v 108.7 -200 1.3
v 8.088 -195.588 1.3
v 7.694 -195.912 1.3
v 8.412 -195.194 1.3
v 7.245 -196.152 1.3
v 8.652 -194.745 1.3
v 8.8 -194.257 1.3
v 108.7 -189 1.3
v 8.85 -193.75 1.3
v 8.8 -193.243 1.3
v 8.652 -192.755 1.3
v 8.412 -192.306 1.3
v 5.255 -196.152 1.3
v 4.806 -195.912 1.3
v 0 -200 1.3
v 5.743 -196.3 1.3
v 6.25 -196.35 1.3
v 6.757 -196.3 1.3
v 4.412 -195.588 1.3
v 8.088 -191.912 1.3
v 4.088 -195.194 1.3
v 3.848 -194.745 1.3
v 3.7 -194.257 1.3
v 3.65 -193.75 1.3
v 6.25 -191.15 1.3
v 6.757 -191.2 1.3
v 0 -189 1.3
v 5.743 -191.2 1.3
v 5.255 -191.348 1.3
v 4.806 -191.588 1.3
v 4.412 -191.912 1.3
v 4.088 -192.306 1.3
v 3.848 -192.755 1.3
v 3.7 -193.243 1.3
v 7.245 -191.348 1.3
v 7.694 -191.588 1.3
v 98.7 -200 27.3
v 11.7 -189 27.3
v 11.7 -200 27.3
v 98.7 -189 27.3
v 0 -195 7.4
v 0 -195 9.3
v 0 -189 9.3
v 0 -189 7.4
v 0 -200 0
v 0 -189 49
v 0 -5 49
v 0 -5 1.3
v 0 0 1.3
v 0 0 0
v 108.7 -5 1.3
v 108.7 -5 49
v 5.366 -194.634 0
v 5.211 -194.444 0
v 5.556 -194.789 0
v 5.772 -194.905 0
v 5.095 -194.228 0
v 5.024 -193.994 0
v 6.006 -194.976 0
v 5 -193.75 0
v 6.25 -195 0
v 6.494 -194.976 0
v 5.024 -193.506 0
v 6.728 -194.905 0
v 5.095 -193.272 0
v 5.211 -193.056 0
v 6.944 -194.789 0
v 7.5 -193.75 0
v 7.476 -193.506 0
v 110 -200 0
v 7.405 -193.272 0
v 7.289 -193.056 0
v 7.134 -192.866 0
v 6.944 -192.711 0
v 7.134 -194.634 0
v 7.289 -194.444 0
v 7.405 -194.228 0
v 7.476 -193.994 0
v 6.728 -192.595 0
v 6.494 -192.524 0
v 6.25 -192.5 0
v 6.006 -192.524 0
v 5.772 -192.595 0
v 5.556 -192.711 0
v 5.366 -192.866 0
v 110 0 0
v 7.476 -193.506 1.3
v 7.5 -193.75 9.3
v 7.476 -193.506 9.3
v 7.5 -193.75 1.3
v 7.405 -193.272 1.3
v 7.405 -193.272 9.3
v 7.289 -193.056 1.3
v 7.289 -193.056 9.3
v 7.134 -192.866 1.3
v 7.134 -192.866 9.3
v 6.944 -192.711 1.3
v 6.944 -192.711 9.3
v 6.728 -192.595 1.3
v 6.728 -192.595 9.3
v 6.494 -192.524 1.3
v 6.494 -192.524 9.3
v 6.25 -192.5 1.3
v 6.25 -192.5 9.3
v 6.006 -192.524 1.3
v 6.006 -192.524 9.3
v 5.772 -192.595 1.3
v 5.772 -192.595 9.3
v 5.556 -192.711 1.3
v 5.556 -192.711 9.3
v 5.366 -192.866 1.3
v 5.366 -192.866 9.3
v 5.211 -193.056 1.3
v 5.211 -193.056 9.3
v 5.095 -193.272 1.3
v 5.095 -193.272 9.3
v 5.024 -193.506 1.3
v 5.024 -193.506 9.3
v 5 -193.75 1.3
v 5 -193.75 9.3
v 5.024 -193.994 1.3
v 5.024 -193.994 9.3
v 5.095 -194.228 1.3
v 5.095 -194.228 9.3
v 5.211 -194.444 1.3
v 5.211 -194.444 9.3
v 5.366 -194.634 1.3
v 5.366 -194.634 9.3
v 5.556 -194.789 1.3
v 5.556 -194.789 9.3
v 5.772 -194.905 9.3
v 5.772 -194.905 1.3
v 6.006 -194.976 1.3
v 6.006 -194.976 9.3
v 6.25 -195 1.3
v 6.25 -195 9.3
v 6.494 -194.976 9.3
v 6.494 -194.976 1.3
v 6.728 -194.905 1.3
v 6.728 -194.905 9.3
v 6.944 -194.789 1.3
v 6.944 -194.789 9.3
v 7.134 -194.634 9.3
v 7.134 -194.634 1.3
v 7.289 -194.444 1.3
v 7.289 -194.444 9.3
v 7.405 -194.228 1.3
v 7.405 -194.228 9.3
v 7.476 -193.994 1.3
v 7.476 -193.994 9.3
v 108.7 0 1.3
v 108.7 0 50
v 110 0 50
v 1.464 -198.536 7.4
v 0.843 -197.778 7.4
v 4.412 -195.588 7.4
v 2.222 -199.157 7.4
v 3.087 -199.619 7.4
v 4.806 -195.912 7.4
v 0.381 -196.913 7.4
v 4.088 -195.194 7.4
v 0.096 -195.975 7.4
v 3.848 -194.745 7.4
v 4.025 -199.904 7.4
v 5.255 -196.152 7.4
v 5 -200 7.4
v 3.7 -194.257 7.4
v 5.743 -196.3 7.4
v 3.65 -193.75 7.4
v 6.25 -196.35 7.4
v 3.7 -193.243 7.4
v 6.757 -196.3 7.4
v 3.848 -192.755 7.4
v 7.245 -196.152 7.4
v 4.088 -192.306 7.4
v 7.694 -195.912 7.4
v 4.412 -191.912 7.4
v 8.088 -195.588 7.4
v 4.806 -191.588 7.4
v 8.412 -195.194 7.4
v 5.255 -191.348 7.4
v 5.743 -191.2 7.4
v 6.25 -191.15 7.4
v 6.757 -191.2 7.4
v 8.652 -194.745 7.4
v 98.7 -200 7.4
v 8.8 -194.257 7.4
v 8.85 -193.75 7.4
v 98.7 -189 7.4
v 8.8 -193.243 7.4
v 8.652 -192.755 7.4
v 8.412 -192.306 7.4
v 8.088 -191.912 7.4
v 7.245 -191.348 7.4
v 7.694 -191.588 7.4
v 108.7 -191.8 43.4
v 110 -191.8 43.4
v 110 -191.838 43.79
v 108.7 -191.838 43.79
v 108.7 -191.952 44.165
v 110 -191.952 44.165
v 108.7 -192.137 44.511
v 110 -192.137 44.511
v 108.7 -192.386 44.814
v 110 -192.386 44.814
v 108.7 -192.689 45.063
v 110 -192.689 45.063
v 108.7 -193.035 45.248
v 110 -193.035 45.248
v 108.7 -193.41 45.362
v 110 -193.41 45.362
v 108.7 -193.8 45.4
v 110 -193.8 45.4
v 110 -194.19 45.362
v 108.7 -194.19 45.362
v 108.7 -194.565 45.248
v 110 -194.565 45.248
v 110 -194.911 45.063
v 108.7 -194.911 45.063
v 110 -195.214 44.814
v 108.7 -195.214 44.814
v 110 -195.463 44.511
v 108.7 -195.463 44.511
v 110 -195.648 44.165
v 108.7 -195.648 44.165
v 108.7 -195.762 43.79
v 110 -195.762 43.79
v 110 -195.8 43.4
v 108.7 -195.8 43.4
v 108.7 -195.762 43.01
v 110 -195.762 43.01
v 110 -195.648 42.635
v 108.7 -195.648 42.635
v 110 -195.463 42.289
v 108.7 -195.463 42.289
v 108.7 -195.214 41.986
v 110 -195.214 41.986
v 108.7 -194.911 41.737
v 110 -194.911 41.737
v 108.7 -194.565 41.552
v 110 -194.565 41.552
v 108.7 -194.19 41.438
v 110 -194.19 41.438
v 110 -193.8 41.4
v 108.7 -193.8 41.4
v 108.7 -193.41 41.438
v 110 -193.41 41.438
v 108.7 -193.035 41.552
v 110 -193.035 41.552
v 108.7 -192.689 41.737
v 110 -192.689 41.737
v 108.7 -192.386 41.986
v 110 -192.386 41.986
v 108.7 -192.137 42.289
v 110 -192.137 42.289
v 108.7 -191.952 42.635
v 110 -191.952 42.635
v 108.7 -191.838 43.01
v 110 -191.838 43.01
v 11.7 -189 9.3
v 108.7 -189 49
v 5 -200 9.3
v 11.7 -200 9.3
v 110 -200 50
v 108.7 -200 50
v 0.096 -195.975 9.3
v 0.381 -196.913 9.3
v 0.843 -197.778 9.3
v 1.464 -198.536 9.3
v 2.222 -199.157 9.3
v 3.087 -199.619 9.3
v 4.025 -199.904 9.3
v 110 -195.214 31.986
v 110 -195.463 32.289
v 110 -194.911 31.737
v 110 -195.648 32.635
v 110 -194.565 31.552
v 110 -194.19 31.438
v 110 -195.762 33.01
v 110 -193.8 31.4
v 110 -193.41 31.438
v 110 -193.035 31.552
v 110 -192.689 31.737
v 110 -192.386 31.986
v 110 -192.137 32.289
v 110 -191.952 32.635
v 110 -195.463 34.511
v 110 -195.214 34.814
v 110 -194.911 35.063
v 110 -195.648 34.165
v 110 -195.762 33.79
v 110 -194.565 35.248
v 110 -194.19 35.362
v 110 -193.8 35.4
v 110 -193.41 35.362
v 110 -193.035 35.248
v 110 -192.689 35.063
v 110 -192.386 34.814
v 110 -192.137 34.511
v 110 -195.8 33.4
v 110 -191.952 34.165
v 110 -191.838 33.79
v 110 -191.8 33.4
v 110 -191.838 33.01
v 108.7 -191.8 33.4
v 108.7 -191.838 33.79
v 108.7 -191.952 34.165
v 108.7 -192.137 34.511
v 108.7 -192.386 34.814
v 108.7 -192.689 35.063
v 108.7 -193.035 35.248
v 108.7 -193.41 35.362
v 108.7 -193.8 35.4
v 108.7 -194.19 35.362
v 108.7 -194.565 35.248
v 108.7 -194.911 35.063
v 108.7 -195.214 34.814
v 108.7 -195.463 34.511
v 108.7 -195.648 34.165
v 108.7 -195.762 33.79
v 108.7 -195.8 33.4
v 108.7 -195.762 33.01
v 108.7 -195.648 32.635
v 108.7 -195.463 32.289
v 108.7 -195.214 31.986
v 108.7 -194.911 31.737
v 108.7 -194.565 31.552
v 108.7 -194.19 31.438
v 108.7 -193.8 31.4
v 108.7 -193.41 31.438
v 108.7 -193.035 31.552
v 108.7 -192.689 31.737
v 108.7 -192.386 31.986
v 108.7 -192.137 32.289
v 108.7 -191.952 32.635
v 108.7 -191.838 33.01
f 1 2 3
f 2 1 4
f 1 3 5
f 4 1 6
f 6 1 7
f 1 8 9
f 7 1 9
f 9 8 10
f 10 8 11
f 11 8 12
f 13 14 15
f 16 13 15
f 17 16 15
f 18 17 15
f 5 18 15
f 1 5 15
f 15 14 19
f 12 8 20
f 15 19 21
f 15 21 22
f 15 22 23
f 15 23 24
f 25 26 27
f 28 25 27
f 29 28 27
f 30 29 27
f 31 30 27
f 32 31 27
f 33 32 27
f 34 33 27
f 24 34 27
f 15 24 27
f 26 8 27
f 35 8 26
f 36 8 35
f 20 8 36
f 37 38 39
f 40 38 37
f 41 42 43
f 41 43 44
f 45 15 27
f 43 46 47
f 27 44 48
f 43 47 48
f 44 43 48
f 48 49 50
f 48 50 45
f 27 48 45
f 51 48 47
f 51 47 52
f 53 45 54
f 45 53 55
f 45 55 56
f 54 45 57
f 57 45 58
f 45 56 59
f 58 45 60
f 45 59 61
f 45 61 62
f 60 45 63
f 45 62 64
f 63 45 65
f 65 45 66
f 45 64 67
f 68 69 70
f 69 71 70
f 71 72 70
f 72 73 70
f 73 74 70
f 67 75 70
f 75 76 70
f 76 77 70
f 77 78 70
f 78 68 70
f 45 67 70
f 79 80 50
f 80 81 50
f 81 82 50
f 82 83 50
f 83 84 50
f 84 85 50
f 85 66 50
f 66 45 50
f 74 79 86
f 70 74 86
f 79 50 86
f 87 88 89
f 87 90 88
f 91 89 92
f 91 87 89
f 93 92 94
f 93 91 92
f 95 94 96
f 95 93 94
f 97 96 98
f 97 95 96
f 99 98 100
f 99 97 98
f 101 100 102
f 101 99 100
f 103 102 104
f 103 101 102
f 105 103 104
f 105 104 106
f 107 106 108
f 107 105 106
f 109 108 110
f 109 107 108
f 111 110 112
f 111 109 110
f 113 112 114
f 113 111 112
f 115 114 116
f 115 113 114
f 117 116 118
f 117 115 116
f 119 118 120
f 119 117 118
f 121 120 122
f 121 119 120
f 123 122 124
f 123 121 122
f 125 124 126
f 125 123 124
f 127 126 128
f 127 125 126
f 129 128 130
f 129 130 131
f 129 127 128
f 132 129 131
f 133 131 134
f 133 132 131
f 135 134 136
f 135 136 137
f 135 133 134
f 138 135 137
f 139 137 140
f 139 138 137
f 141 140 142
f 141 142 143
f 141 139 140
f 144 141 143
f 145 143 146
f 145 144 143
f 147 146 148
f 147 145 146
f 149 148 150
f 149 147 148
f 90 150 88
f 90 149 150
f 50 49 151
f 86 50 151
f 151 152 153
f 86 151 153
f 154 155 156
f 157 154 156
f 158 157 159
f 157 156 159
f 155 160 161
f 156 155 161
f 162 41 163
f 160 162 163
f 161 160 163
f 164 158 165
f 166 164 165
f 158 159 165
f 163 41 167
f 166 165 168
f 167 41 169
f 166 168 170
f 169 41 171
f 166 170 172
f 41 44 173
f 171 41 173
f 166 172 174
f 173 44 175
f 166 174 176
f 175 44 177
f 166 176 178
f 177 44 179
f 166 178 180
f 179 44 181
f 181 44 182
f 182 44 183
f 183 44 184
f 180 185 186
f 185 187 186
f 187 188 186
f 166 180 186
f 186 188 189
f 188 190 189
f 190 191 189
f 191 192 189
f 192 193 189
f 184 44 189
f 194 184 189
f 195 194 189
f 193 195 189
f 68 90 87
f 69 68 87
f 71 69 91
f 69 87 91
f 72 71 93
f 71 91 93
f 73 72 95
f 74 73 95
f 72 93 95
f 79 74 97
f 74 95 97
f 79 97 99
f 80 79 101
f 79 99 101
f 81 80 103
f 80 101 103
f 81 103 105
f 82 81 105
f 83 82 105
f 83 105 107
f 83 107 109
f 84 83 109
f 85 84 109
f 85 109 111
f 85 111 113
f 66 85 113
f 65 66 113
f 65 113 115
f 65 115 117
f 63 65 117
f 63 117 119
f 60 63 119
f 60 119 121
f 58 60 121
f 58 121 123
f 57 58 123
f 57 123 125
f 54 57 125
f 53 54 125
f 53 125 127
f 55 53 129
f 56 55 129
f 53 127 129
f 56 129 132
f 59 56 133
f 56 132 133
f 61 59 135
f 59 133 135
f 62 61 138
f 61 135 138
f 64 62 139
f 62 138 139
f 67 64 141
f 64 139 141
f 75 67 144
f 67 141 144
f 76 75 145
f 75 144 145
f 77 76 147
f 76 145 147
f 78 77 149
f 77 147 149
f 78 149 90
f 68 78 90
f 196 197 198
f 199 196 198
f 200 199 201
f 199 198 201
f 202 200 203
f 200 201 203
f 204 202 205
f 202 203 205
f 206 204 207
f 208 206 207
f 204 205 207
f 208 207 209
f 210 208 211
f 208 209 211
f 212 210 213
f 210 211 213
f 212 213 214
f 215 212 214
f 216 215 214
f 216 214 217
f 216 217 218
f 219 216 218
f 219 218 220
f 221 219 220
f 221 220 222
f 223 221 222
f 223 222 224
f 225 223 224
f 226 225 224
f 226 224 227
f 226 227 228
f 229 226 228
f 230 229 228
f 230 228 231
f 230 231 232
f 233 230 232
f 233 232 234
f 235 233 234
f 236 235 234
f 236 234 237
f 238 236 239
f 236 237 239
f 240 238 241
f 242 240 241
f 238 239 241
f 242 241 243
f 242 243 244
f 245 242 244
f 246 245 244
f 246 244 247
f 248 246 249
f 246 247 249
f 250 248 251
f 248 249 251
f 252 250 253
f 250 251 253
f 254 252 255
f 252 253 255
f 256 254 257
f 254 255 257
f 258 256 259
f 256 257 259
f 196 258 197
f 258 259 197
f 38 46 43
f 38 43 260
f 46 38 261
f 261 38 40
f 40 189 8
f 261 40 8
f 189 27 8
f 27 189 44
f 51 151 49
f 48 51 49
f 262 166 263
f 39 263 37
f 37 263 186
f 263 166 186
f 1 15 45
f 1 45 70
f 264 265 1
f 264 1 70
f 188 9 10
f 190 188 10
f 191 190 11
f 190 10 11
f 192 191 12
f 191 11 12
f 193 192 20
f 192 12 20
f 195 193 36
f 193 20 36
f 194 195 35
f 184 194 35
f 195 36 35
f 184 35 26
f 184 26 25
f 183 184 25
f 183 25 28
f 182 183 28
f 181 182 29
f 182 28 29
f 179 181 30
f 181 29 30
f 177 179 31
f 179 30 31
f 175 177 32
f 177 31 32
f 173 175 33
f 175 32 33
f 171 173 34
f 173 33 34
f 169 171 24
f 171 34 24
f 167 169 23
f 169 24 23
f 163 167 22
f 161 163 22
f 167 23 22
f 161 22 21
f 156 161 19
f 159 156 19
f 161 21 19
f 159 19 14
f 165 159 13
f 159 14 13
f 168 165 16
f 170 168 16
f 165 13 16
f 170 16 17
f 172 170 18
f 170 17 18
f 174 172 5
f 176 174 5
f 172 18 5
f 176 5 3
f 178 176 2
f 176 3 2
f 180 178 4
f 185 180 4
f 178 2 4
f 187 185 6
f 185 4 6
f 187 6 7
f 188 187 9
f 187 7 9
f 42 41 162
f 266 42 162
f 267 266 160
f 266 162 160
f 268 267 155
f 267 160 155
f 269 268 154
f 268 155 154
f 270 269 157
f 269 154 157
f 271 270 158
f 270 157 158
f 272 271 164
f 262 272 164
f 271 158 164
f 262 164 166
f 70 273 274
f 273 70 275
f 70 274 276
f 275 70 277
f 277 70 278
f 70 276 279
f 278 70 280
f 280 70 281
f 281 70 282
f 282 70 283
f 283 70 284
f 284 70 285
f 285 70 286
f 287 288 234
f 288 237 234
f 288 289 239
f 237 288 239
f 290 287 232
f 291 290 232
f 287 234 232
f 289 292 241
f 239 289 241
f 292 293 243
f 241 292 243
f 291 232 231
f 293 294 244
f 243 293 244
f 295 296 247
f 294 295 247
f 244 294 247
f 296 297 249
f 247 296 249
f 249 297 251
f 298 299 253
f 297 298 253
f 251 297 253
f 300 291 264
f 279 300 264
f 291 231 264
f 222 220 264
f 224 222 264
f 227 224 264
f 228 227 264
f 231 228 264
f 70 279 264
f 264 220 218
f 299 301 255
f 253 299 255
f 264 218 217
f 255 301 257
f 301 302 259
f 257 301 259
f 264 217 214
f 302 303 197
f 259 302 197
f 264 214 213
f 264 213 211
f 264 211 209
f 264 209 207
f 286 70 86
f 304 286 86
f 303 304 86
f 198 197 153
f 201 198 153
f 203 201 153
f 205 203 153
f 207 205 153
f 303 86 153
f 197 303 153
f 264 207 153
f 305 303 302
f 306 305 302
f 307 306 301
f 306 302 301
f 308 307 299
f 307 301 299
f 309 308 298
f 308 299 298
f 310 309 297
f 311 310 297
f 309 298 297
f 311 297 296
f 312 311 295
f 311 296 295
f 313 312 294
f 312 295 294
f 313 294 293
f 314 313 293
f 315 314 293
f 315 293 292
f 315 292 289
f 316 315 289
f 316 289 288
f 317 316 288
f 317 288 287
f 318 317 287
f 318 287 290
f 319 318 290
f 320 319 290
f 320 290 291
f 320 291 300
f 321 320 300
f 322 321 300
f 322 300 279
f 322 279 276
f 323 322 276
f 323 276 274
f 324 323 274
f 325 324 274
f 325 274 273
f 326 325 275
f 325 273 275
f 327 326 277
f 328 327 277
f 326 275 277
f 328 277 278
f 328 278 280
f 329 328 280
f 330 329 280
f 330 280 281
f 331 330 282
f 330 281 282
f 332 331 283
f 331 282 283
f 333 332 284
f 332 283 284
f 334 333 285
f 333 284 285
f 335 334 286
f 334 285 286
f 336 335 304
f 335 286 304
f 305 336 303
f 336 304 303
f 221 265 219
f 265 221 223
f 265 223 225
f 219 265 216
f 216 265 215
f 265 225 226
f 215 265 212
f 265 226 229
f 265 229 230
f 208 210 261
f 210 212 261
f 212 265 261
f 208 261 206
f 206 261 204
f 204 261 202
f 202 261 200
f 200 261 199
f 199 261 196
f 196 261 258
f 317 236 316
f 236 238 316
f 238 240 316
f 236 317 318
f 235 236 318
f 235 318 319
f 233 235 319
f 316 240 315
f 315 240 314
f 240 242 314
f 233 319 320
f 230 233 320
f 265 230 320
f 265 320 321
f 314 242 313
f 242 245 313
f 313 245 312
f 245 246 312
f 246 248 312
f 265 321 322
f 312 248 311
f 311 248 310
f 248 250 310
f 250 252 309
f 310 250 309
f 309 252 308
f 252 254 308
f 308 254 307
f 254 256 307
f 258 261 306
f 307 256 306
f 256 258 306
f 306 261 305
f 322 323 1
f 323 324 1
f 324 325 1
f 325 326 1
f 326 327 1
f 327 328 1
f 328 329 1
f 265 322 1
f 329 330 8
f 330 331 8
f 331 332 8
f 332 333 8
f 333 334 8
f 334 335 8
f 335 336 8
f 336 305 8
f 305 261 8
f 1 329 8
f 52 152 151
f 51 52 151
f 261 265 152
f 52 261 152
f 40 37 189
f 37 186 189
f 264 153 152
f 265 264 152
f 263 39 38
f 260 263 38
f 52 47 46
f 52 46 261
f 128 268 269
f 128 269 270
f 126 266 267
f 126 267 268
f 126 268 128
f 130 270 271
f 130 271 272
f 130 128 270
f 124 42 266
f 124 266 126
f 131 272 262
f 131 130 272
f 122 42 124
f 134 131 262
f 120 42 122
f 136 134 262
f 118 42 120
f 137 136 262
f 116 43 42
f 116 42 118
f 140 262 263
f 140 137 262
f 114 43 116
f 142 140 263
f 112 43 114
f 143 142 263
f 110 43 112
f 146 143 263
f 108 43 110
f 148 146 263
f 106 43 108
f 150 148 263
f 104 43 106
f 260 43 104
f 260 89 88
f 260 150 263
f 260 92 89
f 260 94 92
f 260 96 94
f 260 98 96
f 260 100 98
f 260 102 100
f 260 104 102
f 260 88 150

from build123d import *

# Parameters (mm, degrees)
F1_DEPTH  = 200
F2_W      = 108.7
F2_H      = 184
F3_DEPTH  = 47.7
F5_R      = 2.6
F5_R_2    = 1.25
F6_DEPTH  = 6.1
F7_R      = 2.6
F7_R_2    = 1.25
F8_DEPTH  = 1.9
F9_W      = 87
F9_H      = 11
F10_DEPTH = 18
F4_R      = 2
F11_DEPTH = 110.001
F12_DEPTH = 1.301


with BuildPart() as f1:
    # F0 (on Front) → F1 (new body)
    with BuildSketch(Plane.XZ):
        Polygon((0, 1.3), (0, 0), (110, 0), (110, 50), (108.7, 50), (108.7, 1.3), align=None)
    extrude(amount=F1_DEPTH)

    # F2 (on face) → F3 (join, through all)
    with BuildSketch(Plane.XY.offset(1.3)):
        with Locations((54.35, -97)):
            Rectangle(F2_W, F2_H)
    extrude(amount=F3_DEPTH)

    # F5 (on face) → F6 (join)
    with BuildSketch(Plane.XY.offset(1.3)):
        with Locations((6.25, -193.75)):
            Circle(F5_R)
        with Locations((6.25, -193.75)):
            Circle(F5_R_2, mode=Mode.SUBTRACT)
    extrude(amount=F6_DEPTH)

    # F7 (on face) → F8 (join)
    with BuildSketch(Plane.XY.offset(7.4)):
        with BuildLine():
            Line((98.7, -200), (98.7, -189))
            Line((98.7, -189), (0, -189))
            Line((0, -189), (0, -195))
            ThreePointArc((0, -195), (1.4644660941, -198.5355339059), (5, -200))
            Line((5, -200), (98.7, -200))
        make_face()
        with Locations((6.25, -193.75)):
            Circle(F7_R, mode=Mode.SUBTRACT)
        with Locations((6.25, -193.75)):
            Circle(F7_R)
        with Locations((6.25, -193.75)):
            Circle(F7_R_2, mode=Mode.SUBTRACT)
    extrude(amount=F8_DEPTH)

    # F9 (on face) → F10 (join)
    with BuildSketch(Plane.XY.offset(9.3)):
        with Locations((55.2, -194.5)):
            Rectangle(F9_W, F9_H)
    extrude(amount=F10_DEPTH)

    # F4 (on face) → F11 (cut, through all)
    with BuildSketch(Plane.YZ.offset(110)):
        with Locations((-193.8, 43.4)):
            Circle(F4_R)
        with Locations((-193.8, 33.4)):
            Circle(F4_R)
    extrude(amount=-F11_DEPTH, mode=Mode.SUBTRACT)

    # F12 (cut, through all): a face of the model
    f12_faces = [f1.faces().sort_by_distance(p)[0] for p in [
        (6.25, -193.75, 1.3),
    ]]
    extrude(f12_faces, amount=-F12_DEPTH, mode=Mode.SUBTRACT)


solid = f1.part
